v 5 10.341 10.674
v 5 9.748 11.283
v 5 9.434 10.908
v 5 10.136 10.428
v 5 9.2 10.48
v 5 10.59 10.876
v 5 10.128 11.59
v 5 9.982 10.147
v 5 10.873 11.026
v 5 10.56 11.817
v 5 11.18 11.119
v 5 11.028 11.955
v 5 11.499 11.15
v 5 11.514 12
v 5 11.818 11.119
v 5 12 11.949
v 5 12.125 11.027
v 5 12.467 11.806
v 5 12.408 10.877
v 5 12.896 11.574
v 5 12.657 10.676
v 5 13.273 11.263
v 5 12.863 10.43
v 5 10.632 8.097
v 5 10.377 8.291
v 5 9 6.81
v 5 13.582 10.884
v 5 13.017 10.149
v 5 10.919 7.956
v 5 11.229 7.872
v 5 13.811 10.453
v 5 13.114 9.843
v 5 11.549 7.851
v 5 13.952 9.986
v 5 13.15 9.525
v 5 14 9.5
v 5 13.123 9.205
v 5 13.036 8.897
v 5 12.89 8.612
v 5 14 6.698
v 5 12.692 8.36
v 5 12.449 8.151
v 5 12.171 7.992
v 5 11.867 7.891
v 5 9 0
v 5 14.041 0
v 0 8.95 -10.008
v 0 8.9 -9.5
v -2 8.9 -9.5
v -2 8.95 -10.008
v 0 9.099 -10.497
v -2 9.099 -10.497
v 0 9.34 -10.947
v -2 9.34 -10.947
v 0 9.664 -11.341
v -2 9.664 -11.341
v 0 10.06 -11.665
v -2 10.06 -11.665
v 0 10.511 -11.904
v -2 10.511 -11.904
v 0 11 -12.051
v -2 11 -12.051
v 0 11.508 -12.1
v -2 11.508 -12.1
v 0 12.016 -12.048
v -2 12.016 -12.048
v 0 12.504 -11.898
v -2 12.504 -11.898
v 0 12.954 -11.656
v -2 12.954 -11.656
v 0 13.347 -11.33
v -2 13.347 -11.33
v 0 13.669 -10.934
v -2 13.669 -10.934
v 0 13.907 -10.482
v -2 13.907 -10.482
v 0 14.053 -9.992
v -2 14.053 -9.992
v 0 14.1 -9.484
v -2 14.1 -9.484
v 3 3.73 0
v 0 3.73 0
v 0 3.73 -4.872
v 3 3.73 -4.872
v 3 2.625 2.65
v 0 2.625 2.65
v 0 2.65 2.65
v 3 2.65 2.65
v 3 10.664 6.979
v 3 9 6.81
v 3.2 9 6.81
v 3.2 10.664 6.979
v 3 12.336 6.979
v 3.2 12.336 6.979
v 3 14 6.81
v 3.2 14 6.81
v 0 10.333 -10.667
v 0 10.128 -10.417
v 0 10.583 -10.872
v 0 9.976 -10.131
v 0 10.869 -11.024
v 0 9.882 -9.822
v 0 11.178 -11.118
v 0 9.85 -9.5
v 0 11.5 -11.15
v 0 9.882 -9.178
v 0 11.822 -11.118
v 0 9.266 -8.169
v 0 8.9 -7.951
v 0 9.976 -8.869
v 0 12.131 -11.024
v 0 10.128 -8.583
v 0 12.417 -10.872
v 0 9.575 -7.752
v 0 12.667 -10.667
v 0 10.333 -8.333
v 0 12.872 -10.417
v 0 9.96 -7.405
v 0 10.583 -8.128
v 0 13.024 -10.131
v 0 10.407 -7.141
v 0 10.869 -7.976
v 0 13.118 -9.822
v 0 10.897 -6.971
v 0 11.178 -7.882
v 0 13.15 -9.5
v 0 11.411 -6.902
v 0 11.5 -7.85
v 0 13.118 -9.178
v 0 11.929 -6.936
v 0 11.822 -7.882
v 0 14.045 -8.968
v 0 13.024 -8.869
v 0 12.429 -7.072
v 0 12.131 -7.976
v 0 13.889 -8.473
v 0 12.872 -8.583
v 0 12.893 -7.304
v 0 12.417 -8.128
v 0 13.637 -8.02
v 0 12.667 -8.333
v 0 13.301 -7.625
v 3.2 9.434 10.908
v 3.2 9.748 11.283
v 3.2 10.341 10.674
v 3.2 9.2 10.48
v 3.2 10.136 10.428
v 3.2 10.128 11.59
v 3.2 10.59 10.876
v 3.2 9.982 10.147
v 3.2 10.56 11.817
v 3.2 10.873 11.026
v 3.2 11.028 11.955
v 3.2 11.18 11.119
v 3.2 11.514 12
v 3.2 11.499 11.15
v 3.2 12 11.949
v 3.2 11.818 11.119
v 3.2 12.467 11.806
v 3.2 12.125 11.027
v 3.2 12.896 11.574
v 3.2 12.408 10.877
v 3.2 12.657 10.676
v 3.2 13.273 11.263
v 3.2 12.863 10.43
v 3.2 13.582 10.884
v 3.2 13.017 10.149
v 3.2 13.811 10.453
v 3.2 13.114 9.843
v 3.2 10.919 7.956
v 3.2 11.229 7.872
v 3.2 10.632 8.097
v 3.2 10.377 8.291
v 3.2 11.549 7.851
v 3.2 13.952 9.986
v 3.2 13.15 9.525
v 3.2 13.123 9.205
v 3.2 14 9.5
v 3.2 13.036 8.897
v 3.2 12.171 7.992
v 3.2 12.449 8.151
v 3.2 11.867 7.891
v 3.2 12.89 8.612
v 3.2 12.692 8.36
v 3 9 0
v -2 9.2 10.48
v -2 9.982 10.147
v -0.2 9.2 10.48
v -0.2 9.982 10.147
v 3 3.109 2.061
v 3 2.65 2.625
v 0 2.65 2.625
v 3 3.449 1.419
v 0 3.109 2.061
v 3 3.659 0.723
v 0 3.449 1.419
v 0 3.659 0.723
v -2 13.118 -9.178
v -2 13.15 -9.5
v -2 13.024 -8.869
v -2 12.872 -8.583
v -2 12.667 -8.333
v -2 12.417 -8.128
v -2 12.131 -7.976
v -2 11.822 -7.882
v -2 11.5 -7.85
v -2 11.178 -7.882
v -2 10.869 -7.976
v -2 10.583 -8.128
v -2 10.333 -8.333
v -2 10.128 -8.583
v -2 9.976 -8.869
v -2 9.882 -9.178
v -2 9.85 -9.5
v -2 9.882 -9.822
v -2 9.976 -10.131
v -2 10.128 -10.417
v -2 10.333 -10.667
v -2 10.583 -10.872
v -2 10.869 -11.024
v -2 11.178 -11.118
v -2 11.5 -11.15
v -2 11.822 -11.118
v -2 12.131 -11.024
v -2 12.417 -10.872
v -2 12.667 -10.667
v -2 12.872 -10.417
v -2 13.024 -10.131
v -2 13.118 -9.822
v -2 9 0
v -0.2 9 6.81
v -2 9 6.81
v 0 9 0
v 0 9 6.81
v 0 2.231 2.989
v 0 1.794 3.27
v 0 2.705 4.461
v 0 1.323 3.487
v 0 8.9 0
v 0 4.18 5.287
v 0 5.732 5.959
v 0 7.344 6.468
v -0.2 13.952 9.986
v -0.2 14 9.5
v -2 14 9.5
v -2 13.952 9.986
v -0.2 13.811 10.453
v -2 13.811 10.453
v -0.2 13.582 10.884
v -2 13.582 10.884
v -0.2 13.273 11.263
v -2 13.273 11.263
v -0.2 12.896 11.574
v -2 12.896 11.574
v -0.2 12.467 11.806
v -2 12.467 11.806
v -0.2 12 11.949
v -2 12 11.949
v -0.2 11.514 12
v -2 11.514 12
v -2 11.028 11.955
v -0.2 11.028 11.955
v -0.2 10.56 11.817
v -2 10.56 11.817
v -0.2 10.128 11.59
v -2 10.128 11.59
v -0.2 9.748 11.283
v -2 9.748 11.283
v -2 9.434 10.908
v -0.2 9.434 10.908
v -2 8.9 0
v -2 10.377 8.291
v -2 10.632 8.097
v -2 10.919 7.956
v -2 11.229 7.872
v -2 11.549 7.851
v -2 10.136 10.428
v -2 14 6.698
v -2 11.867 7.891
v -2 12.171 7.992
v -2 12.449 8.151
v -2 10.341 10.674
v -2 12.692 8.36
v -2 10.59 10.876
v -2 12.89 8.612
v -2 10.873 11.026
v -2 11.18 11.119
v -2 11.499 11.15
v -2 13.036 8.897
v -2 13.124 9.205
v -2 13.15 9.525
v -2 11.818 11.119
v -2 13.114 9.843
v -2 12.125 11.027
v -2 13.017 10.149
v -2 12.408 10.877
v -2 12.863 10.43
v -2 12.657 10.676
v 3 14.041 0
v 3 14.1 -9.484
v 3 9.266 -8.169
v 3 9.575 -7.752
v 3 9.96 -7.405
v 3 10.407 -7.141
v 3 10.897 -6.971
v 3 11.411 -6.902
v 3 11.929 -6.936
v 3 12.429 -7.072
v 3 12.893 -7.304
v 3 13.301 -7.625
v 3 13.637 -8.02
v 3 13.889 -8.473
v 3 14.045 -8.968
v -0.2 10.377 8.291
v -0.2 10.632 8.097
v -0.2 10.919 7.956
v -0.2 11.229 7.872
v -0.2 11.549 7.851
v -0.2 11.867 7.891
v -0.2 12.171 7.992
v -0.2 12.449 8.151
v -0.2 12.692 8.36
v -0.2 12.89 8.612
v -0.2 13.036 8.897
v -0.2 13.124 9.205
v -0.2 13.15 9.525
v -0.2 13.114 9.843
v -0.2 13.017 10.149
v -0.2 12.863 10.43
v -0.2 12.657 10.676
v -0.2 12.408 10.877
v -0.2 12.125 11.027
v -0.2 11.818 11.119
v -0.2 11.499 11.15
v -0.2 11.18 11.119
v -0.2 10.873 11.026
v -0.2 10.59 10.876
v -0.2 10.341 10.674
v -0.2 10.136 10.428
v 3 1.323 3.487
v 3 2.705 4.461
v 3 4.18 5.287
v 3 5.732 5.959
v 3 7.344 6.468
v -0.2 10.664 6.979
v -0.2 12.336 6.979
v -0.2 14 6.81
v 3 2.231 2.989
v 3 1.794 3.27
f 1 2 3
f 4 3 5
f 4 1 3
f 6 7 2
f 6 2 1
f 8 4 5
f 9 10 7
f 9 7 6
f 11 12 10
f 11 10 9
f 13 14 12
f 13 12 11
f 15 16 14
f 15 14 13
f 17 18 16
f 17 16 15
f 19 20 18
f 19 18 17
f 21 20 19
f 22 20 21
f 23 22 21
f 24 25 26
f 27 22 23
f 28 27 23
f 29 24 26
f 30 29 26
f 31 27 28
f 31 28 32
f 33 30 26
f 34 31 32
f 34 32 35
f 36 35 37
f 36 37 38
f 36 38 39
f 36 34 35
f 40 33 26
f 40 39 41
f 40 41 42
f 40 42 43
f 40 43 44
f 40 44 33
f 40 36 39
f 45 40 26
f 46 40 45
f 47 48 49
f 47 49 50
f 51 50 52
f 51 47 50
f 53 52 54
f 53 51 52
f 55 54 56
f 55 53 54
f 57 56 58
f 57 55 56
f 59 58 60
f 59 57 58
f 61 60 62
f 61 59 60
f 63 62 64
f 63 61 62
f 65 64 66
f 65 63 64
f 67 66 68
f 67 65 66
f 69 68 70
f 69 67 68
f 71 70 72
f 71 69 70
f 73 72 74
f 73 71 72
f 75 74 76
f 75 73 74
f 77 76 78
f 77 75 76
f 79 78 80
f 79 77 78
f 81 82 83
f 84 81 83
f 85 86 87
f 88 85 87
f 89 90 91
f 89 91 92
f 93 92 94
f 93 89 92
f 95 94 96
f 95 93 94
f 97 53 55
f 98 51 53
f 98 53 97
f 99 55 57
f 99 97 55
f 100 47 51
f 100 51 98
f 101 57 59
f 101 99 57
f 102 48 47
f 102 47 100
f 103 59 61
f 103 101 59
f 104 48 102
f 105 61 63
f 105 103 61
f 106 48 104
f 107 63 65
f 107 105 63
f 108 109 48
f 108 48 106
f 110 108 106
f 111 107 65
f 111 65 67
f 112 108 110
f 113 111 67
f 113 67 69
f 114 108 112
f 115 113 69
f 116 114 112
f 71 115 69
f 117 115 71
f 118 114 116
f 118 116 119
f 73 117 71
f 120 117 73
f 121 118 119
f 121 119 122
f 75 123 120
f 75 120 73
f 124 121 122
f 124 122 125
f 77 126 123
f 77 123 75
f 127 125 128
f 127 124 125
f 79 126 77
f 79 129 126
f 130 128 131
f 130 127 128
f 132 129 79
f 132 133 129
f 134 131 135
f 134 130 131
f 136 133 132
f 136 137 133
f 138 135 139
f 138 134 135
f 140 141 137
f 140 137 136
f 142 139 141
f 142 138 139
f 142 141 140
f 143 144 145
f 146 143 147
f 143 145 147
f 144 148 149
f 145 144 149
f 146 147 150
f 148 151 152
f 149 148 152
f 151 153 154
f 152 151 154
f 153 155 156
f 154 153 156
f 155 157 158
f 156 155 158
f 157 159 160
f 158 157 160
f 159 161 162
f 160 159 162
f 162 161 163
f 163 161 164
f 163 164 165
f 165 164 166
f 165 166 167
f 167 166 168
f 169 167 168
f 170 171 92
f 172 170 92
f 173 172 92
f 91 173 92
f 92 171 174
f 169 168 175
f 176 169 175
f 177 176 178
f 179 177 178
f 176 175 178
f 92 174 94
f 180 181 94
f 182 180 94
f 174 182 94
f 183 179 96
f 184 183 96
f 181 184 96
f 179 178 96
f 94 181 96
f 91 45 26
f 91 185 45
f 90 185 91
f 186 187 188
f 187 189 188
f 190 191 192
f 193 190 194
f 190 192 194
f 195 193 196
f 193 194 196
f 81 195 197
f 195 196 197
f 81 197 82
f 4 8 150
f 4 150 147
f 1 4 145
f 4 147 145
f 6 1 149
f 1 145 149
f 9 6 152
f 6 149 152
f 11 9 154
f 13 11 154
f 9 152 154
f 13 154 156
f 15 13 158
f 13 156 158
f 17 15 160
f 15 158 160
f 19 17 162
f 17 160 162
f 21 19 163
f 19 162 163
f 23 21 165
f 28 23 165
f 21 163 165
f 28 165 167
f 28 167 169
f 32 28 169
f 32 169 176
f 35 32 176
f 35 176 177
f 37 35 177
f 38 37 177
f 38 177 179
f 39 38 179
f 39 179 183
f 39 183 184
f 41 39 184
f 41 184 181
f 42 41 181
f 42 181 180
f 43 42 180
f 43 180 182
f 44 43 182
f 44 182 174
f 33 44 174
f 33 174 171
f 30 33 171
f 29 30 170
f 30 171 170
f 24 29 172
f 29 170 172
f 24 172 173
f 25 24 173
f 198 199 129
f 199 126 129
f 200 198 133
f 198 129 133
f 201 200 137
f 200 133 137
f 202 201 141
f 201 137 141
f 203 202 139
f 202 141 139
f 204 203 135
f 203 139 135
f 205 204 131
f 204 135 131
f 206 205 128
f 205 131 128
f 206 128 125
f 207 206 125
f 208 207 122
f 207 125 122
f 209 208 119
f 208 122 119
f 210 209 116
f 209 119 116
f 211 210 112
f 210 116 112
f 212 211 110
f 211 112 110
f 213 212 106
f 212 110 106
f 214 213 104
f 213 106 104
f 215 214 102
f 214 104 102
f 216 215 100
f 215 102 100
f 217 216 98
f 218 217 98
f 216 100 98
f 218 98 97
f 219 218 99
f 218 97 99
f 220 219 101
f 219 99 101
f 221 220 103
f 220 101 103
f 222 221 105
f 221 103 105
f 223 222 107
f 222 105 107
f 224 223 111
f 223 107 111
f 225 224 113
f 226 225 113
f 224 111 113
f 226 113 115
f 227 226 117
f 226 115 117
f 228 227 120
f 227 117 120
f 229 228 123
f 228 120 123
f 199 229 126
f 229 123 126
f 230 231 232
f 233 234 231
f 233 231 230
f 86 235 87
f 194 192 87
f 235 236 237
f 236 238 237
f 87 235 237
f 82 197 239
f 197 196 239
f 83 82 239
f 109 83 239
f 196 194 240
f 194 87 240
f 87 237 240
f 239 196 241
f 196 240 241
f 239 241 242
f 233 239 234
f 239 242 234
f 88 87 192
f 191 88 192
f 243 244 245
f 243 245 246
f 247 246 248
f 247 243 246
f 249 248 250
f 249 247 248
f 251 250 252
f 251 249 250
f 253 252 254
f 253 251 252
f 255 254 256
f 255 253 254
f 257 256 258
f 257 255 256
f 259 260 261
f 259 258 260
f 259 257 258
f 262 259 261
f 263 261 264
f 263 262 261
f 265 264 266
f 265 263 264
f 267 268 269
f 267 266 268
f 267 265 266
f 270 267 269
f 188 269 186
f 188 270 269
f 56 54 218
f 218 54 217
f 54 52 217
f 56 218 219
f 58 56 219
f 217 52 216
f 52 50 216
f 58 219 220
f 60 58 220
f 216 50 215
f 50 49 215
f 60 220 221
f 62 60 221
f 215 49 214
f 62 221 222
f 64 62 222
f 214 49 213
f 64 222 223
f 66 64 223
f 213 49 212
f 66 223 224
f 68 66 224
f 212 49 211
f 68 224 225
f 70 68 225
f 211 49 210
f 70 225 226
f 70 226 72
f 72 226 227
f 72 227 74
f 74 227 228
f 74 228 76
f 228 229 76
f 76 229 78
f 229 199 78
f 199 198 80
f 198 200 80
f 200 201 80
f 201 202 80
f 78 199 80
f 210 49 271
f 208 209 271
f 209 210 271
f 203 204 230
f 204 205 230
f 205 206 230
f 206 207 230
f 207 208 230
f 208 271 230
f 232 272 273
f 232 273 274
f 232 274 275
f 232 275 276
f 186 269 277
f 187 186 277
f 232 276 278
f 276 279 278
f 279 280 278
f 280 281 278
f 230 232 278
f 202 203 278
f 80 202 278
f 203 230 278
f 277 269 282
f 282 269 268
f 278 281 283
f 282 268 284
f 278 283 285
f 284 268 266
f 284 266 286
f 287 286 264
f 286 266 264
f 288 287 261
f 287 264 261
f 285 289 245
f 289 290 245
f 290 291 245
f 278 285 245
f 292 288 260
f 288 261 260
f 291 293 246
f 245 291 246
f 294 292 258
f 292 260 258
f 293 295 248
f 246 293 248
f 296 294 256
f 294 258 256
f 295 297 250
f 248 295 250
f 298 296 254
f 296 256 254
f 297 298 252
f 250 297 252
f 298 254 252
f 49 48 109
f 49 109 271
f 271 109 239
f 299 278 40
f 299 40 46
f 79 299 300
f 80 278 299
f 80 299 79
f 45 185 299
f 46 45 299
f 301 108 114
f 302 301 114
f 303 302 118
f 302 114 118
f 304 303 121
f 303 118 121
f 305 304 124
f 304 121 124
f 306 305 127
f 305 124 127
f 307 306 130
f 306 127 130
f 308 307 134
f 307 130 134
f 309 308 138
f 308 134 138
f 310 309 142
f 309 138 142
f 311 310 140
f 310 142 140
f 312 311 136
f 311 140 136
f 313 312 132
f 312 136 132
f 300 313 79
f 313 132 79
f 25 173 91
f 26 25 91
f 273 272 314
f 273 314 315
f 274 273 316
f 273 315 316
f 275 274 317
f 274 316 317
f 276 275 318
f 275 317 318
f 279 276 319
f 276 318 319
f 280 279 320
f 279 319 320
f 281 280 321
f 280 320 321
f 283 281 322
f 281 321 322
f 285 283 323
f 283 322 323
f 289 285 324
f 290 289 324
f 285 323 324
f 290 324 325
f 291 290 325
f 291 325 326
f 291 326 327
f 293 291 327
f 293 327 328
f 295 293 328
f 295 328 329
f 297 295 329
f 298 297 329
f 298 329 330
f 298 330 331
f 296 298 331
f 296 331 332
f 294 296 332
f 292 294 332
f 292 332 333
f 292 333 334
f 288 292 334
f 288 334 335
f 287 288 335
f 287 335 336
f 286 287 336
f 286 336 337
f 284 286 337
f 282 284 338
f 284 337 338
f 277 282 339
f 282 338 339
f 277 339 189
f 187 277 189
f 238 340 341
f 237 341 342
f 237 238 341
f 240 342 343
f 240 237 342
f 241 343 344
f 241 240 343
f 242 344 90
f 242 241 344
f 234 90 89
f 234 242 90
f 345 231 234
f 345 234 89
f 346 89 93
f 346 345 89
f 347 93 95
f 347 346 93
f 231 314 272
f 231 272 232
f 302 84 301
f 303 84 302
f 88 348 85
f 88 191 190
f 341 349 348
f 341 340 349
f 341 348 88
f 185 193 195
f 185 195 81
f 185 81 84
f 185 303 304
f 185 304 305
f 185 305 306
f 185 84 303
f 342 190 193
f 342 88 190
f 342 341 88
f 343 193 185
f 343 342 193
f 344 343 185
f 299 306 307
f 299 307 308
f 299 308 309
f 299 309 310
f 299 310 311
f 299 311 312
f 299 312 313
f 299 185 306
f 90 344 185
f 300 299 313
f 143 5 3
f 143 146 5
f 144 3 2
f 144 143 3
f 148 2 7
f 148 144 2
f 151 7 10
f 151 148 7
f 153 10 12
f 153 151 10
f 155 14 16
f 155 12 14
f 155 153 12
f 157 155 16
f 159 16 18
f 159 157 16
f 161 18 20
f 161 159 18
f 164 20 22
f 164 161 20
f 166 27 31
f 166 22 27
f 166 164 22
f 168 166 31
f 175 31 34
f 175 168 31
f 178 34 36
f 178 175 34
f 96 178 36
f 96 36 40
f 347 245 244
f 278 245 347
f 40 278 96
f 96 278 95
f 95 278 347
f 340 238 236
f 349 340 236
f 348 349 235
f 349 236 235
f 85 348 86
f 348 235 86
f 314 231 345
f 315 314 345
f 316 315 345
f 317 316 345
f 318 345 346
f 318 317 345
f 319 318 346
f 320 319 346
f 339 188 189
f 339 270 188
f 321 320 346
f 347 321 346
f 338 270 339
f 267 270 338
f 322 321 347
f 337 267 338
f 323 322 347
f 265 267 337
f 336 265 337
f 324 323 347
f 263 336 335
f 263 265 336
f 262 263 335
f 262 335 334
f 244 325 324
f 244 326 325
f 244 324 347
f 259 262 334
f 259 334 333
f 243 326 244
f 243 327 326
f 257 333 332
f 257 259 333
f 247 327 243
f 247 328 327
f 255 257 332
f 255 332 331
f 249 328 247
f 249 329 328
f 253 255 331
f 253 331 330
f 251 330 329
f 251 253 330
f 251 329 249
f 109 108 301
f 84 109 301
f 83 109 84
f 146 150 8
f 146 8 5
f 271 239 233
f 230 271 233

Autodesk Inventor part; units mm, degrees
ref_plane "YZ Plane" through (0, 0, 0) normal (1, 0, 0) x (0, 1, 0)
ref_plane "XZ Plane" through (0, 0, 0) normal (0, 1, 0) x (-1, 0, 0)
ref_plane "XY Plane" through (0, 0, 0) normal (0, 0, 1) x (1, 0, 0)
sketch "スケッチ1" plane through (0, 0, 0) normal (1, 0, 0) x (0, 1, 0)
  line L0 (0, 0) -> (0, 6)
  line L1 (0, 6) -> (0, -6)
  line L2 (0, 0) -> (11.5, 0)
  line L3 (11.5, 0) -> (11.5, 9.5)
  line L4 (11.5, 9.5) -> (11.5, -9.5)
  circle A0 centre (0, 6) radius 1.25
  circle A1 centre (0, -6) radius 1.25
  circle A2 centre (11.5, 9.5) radius 1.65
  circle A3 centre (11.5, -9.5) radius 1.65
  circle A4 centre (11.5, 9.5) radius 2.5
  circle A5 centre (11.5, -9.5) radius 2.5
  circle A6 centre (0, 0) radius 2.65
  line L5 (0, 0) -> (-14.6, 0)
  circle A7 centre (-14.6, 0) radius 1.65
  circle A8 centre (-14.6, 0) radius 2.5
  circle A9 centre (0, 6) radius 2
  circle A10 centre (0, -6) radius 2
  line L6 (0, 8) -> (10.6499, 11.851)
  line L7 (0, -8) -> (10.6499, -11.851)
  line L8 (-14.6, 0) -> (-14.6, -2.5)
  line L9 (-14.6, 0) -> (-12.1, 0) construction
  line L10 (-14.6, -2.5) -> (-14.6, 2.5)
  line L11 (-14.6, -2.5) -> (-0.7212, -7.8655)
  line L12 (-14.6, 2.5) -> (-0.7212, 7.8655)
  circle A11 centre (11.5, -9.5) radius 14.9164
  line L13 (11.5, -9.5) -> (0, 0)
  line L14 (11.5, -9.5) -> (0, -2.65)
  line L15 (14, 9.5) -> (14, 6.6979)
  circle A12 centre (11.5, -9.5) radius 16.7294
  circle A13 centre (11.5, -9.5) radius 2.6
  circle A14 centre (11.5, -9.5) radius 16.5
  line L16 (14, 6.6979) -> (14.1, -9.4839)
  line L17 (8.9, -9.5) -> (8.9, 0)
  line L18 (9, 9.5) -> (9, 0)
  line L19 (14.0414, 0) -> (11.5, 0)
  line L20 (0, 2.65) -> (2.65, 2.65)
  line L21 (2.65, 2.65) -> (2.65, 0)
  line L22 (2.65, 2.65) -> (2.65, 4.4258)
  circle A15 centre (0, 0) radius 3.575
  line L23 (0, 3.575) -> (14.0193, 3.575)
  line L24 (0, 3.575) -> (14.0193, 3.575) construction
  circle A16 centre (0, 0) radius 3.7299
  circle A17 centre (11.5, -9.5) radius 11.1866
  line L25 (0, -3.7299) -> (1.8129, -3.7299)
  line L26 (3.7299, 0) -> (3.7299, -4.8717)
  line L27 (3.7299, -3.7299) -> (1.8129, -3.7299)
  circle A18 centre (11.473, -9.4839) radius 9.6471
  line L28 (11.5, 9.5) -> (9.2001, 10.48)
  line L29 (11.5, 9.5) -> (9, 6.8095)
  point P0 (9.3522, -8.2206)
  point P1 (0, 2.65)
  point P2 (12.4812, 7.2006)
  point P3 (14, 6.8095)
  point P4 (0.3158, 2.6311)
  point P5 (9.2662, -8.1695)
  point P6 (1.3228, 3.4875)
  point P7 (2.6248, 2.65)
  point P8 (2.65, 2.6248)
  point P9 (1.3732, -3.4679)
  point P10 (3.1849, -4.5471)
  point P11 (11.5, 7.2294)
  point P12 (9, 7.0415)
  point P13 (9.9821, 10.1468)
  point P14 (11.5, 7.85)
  point P15 (9.2488, 7.0772)
  point P16 (10.3768, 8.2913)
  dimension "d9" = 5
  dimension "d32" = 7.15
  dimension "d0" = 6
  dimension "d1" = 12
  dimension "d2" = 11.5
  dimension "d3" = 9.5
  dimension "d4" = 19
  dimension "d5" = 2.5
  dimension "d6" = 3.3
  dimension "d7" = 3.3
  dimension "d8" = 5
  dimension "d10" = 5.3
  dimension "d11" = 14.6
  dimension "d12" = 3.3
  dimension "d13" = 5
  dimension "d14" = 4
  dimension "d15" = 4
  dimension "d16" = 90
  dimension "d21" = 5.2
  dimension "d22" = 33
  dimension "d33" = 0
extrude "押し出し3" add sketch "スケッチ1" along normal blind 3 contours L23 L22 L20 A16 A14 | A14 L22 L23 | L18 A11 L23 L22 A14 | A14 L3 A11 L18 | L23 A11 A16 L21 L22 | A14 L15 L16 A11 L3 | L18 L23 A11 | A11 L3 L23 L18 | L23 L18 A17 L2 A16 A11 | L2 A17 L26 | A11 L16 L23 L3 | L23 L3 A17 L18 | A17 L18 L2 | L2 L17 A18 L13 L26 A17 | L13 A18 L26 | L23 L16 A17 L3 | A17 L3 A18 L2 L18 | L2 A18 L17 | A18 L17 L13 | L13 L17 L14 L26 A18 | A17 L16 L19 A18 L3 | A18 L2 L4 A13 L13 L17 | L13 A13 L14 L17 | A18 L19 L3 | L3 L2 A18 | L19 A18 L16 A13 L4 | L19 L16 A18
extrude "押し出し4" add sketch "スケッチ1" against normal blind 2 contours L29 A4 A12 | A12 A4 A14 L29 | A14 L3 A11 L18 | A12 L3 A4 | A4 L29 A2 L3 A12 | A4 A12 L3 A2 L28 | A14 L15 L16 A11 L3 | L3 A12 A4 | A4 A12 L15 A14 | A11 L3 L23 L18 | A11 L16 L23 L3 | A4 L15 A12 | L23 L3 A17 L18 | L23 L16 A17 L3 | A17 L3 A18 L2 L18 | L2 A18 L17 | A17 L16 L19 A18 L3 | A18 L2 L4 A13 L13 L17 | L13 A13 L14 L17 | A18 L19 L3 | L3 L2 A18 | A13 L4 A5 L13 | L13 A5 L14 A13 | L14 A13 L17 | L19 A18 L16 A13 L4 | L19 L16 A18 | A13 L14 A5 L7 | L7 A5 L4 A13 | L13 A3 L14 A5 | A5 L4 A3 L13 | A5 L14 A3 L4
sketch "スケッチ3" plane through (3, 0, 0) normal (1, 0, 0) x (0, 0, -1)
  line L0 (0, 0) -> (0, 11.5)
  line L1 (0, 11.5) -> (-9.5, 11.5)
  circle A0 centre (-9.5, 11.5) radius 1.65
  circle A1 centre (-9.5, 11.5) radius 2.5
  line L2 (-10.1468, 9.9821) -> (-10.48, 9.2001) projected
  line L3 (-9.5, 11.5) -> (-10.48, 9.2001)
  line L4 (-9.5, 11.5) -> (-6.8095, 9)
  arc A2 (-6.8095, 14) -> (-3.4875, 1.3228) centre (9.5, 11.5) ccw projected
  line L5 (0, 9) -> (-6.8095, 9) projected
  line L6 (-6.8095, 9) -> (0, 9)
  line L7 (0, 9) -> (0, 14.0414)
  line L8 (9.4839, 14.1) -> (-6.6979, 14) projected
  line L9 (-9.5, 14) -> (-6.6979, 14) projected
  line L10 (-9.5, 14) -> (0, 14.0414)
  point P0 (-8.2913, 10.3768)
  dimension "d37" = 3.3
  dimension "d34" = 11.5
  dimension "d35" = 9.5
  dimension "d36" = 90
  dimension "d38" = 5
extrude "押し出し6" add sketch "スケッチ3" along normal blind 2 contours L5 A2 L1 L0 | L1 A2 L9 L8 L7 | L4 A1 A2 | A1 L4 A0 L1 | L1 A0 L2 A1 | A1 L9 A2
extrude "押し出し7" cut sketch "スケッチ1" against normal blind 0.2 contours L29 A4 A12 | A12 A4 A14 L29 | A12 L3 A4 | A4 L29 A2 L3 A12 | A4 A12 L3 A2 L28 | L3 A12 A4 | A4 A12 L15 A14 | A4 L15 A12
extrude "押し出し8" cut sketch "スケッチ3" along normal blind 0.2 contours L4 A1 A2 | A1 L4 A0 L1 | L1 A0 L2 A1 | A1 L9 A2
properties part number "ikafly2c7"
